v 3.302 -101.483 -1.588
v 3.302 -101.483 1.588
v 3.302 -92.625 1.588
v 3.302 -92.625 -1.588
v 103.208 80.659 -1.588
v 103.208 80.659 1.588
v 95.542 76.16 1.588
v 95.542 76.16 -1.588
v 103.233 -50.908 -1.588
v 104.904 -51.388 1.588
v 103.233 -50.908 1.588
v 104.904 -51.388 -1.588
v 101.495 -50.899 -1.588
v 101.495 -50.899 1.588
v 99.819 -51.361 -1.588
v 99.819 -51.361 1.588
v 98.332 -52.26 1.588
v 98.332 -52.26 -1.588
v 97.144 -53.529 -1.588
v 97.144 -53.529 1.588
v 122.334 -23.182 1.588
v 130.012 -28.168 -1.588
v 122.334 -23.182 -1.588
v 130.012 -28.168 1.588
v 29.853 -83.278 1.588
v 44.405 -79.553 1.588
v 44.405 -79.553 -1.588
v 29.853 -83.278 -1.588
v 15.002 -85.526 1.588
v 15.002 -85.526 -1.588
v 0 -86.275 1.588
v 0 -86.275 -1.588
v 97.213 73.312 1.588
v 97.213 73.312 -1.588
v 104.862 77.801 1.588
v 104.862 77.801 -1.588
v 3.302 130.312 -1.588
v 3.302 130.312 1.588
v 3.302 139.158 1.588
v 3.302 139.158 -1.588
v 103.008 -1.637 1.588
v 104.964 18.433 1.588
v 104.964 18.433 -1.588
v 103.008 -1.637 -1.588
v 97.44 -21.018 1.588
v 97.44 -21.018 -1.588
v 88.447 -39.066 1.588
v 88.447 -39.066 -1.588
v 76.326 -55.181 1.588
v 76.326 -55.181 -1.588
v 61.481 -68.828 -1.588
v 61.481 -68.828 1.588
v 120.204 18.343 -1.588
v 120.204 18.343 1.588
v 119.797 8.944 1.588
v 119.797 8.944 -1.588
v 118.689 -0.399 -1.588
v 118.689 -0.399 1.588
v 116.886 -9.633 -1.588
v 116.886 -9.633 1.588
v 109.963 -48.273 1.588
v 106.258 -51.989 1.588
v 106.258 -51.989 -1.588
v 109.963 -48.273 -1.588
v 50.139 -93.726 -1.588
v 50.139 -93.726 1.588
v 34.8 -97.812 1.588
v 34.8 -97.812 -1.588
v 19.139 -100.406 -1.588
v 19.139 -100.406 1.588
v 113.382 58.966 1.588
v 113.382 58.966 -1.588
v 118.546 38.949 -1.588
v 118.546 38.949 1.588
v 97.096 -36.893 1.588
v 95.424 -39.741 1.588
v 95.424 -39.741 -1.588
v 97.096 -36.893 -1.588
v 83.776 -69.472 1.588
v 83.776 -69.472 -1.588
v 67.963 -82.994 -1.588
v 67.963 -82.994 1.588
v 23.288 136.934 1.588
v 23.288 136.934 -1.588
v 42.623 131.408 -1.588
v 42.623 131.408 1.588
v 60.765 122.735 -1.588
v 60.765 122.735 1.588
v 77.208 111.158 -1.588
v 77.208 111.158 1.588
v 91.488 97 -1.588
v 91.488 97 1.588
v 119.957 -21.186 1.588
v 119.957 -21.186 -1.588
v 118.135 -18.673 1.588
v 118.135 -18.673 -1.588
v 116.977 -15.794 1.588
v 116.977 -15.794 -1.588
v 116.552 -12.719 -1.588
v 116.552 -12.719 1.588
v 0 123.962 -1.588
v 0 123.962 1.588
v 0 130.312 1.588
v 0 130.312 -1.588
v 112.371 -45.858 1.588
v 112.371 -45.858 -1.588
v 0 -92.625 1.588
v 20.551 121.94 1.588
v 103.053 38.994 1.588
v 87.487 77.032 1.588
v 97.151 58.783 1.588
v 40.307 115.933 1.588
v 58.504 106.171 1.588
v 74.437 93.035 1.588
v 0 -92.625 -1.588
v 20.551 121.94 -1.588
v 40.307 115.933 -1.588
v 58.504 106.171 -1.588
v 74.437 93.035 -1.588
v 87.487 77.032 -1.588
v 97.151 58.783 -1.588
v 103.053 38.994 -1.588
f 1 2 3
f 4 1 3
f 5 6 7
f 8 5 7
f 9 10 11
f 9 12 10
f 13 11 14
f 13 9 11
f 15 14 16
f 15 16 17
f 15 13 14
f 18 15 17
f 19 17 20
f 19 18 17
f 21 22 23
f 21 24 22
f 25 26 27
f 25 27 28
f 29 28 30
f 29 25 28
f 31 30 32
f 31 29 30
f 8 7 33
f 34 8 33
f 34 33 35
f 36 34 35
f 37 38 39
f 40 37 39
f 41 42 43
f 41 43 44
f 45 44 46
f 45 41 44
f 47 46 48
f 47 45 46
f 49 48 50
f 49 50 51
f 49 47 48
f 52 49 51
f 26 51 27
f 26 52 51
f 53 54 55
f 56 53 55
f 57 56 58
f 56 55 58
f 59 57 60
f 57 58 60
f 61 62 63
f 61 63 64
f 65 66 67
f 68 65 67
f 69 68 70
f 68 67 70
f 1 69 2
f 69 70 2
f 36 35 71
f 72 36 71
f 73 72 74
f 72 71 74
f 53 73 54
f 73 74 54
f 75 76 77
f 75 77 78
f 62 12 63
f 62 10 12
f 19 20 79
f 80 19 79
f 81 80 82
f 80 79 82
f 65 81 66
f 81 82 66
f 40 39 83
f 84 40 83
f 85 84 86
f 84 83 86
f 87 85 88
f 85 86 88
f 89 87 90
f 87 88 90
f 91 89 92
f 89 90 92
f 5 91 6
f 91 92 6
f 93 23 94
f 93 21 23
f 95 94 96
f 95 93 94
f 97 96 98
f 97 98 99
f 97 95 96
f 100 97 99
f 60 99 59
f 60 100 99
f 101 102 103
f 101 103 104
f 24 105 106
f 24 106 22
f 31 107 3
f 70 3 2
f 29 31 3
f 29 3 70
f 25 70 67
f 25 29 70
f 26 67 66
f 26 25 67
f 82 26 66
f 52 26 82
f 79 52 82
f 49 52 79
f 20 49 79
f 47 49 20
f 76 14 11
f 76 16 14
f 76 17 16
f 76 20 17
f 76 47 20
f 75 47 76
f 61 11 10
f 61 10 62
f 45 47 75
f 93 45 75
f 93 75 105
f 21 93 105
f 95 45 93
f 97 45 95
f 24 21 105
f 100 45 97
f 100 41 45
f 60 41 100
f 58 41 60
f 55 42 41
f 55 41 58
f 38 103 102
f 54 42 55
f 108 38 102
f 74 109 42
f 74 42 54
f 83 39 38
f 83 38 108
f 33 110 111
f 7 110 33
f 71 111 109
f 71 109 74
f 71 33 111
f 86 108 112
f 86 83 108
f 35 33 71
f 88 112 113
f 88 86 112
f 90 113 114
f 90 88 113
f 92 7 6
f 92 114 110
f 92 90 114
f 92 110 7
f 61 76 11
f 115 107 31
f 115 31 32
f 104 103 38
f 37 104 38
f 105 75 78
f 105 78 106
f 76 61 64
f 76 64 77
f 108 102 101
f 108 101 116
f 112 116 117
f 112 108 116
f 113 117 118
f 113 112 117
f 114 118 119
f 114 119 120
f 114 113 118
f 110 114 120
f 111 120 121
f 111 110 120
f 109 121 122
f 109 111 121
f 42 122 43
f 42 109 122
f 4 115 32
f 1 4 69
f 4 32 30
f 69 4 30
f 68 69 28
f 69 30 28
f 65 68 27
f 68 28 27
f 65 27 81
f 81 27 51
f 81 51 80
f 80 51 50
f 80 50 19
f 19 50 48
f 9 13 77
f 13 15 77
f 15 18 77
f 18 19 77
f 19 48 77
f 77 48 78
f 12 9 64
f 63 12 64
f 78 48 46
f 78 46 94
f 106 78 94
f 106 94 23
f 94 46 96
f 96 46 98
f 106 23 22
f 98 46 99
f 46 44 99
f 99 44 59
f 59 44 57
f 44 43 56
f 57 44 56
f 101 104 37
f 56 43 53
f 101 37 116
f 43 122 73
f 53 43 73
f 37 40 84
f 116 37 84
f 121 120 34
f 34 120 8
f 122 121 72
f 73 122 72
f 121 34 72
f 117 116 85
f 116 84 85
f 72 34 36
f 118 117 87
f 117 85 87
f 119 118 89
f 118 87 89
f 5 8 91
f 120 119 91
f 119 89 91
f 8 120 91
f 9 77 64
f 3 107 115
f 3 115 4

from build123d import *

# Parameters (mm, degrees)
BOSS_EXTRUDE1_DEPTH = 1.5875
SKETCH3_W           = 208.645691316
SKETCH3_H           = 383.026987577
CUT_EXTRUDE1_DEPTH  = 121.098895727
BOSS_EXTRUDE2_DEPTH = 1.5875
FILLET1_R           = 6.35
FILLET2_R           = 12.7
SKETCH6_W           = 3.302
SKETCH6_H           = 12.7
CUT_EXTRUDE2_DEPTH  = 4.175


with BuildPart() as part:
    # Sketch2 → Boss-Extrude1 (new body, symmetric)
    with BuildSketch(Plane.XY):
        with BuildLine():
            ThreePointArc((-120.098895727, 19.05), (0.406748907, 139.2017743), (120.203613722, 18.343301545))
            ThreePointArc((120.203613722, 18.343301545), (101.067699546, -47.629728931), (50.138751442, -93.726))
            ThreePointArc((50.138751442, -93.726), (0.040174098, -101.514794876), (-50.058403246, -93.726))
            ThreePointArc((-50.058403246, -93.726), (-101.163912713, -47.327889321), (-120.098895727, 19.05))
        make_face()
        with BuildLine():
            ThreePointArc((-104.858895727, 19.05), (0.361930242, 123.961840203), (104.963877332, 18.432938489))
            ThreePointArc((104.963877332, 18.432938489), (88.446745877, -39.065849025), (44.40486057, -79.553359885))
            ThreePointArc((44.40486057, -79.553359885), (0.040463589, -86.274794876), (-44.323959374, -79.553531384))
            ThreePointArc((-44.323959374, -79.553531384), (-88.517658334, -38.801393502), (-104.858895727, 19.05))
        make_face(mode=Mode.SUBTRACT)
    extrude(amount=BOSS_EXTRUDE1_DEPTH, both=True)

    # Sketch3 → Cut-Extrude1 (cut, through all)
    with BuildSketch(Plane(origin=(0, 0, 0), x_dir=(0, 0, -1), z_dir=(1, 0, 0))):
        with Locations((4.266053154, 20.866300598)):
            Rectangle(SKETCH3_W, SKETCH3_H)
    extrude(amount=-CUT_EXTRUDE1_DEPTH, mode=Mode.SUBTRACT)

    # Sketch5 → Boss-Extrude2 (add, symmetric)
    with BuildSketch(Plane.XY):
        Polygon((106.258152496, -51.988683319), (130.011728615, -28.168431361), (114.573822099, -18.142937646), (100.046993583, -49.235229101), align=None)
    extrude(amount=BOSS_EXTRUDE2_DEPTH, both=True)

    # Fillet1
    fillet1_edges = [part.edges().sort_by_distance(p)[0] for p in [
        (100.046993583, -49.235229101, 0),
    ]]
    fillet(fillet1_edges, radius=FILLET1_R)

    # Fillet2
    fillet2_edges = [part.edges().sort_by_distance(p)[0] for p in [
        (114.573822099, -18.142937646, 0),
    ]]
    fillet(fillet2_edges, radius=FILLET2_R)

    # Sketch6 → Cut-Extrude2 (cut, through all)
    with BuildSketch(Plane.XY.offset(1.5875)):
        with Locations((1.651, 136.662280289)):
            Rectangle(SKETCH6_W, SKETCH6_H)
        Polygon((108.166218002, 79.740204673), (106.494925174, 82.588008087), (95.541835122, 76.159958748), (97.21312795, 73.312155334), align=None)
        Polygon((95.424252626, -39.741107061), (97.095545407, -36.89330362), (118.130209204, -49.237934313), (116.458916422, -52.085737754), align=None)
        with Locations((1.651, -98.974789488)):
            Rectangle(SKETCH6_W, SKETCH6_H)
    extrude(amount=-CUT_EXTRUDE2_DEPTH, mode=Mode.SUBTRACT)


solid = part.part
